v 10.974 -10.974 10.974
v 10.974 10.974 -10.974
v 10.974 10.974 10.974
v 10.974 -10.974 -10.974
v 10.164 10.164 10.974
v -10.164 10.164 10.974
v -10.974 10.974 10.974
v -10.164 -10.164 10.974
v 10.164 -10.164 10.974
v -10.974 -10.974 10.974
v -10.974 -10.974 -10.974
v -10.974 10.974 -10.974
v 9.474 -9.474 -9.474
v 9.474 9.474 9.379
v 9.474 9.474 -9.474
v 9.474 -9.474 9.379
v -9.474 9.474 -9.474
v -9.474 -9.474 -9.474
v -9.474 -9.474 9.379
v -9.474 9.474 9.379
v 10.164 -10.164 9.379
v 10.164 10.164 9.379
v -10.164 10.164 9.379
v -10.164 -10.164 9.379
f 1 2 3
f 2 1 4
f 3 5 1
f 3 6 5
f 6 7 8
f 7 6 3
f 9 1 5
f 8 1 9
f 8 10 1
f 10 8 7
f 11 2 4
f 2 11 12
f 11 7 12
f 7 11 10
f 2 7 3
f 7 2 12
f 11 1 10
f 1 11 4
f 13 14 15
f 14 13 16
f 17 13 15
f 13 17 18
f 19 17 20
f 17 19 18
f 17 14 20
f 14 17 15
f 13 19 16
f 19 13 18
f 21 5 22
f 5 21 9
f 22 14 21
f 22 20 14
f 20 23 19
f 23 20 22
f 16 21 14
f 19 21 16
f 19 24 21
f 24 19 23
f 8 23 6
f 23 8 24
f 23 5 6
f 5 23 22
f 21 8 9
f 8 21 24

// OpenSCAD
// Cube Jeu Sphère 33mm

// changelog
// v5
// - Bouchon droit

version = 5;

arete = 21.949;
epaisseurParoi = 1.5;
r = 0.19; // résolution d'impression sur l'axe Z

// distance entre la paroi extérieure et la découpe
// minimum semble etre >nozzle_diameter pour Zortrax M200
offset_decoupe_bouchon = 0.81;
bouchonOffset = 0.3;

// Permet meilleur encastrement du bouchon pour ne pas qu'il
// dépasse après collage
decoupeZOffset = -r/2;

//decoupe_bouchon();
corps_ouvert();
// bouchon();
//trou();

module corps_ouvert() {
    difference() {
        cube_creux();
        #decoupe_bouchon(offset_decoupe_bouchon, decoupeZOffset);
    }
}

module bouchon() {
    difference () {
        intersection() {
            cube_creux();
            decoupe_bouchon(offset_decoupe_bouchon+bouchonOffset);
        }
    }
}

module cube_creux() {
    difference() {
        cube(arete, center=true);
        cube(arete-2*epaisseurParoi, center=true);
    }
}

module decoupe_bouchon(d, zOffset = 0) {
    a = arete - 2*d;
    translate([0,0,arete/2+((epaisseurParoi+1)/2)-epaisseurParoi+zOffset])
        cube([a, a, epaisseurParoi+1], center=true);
}
